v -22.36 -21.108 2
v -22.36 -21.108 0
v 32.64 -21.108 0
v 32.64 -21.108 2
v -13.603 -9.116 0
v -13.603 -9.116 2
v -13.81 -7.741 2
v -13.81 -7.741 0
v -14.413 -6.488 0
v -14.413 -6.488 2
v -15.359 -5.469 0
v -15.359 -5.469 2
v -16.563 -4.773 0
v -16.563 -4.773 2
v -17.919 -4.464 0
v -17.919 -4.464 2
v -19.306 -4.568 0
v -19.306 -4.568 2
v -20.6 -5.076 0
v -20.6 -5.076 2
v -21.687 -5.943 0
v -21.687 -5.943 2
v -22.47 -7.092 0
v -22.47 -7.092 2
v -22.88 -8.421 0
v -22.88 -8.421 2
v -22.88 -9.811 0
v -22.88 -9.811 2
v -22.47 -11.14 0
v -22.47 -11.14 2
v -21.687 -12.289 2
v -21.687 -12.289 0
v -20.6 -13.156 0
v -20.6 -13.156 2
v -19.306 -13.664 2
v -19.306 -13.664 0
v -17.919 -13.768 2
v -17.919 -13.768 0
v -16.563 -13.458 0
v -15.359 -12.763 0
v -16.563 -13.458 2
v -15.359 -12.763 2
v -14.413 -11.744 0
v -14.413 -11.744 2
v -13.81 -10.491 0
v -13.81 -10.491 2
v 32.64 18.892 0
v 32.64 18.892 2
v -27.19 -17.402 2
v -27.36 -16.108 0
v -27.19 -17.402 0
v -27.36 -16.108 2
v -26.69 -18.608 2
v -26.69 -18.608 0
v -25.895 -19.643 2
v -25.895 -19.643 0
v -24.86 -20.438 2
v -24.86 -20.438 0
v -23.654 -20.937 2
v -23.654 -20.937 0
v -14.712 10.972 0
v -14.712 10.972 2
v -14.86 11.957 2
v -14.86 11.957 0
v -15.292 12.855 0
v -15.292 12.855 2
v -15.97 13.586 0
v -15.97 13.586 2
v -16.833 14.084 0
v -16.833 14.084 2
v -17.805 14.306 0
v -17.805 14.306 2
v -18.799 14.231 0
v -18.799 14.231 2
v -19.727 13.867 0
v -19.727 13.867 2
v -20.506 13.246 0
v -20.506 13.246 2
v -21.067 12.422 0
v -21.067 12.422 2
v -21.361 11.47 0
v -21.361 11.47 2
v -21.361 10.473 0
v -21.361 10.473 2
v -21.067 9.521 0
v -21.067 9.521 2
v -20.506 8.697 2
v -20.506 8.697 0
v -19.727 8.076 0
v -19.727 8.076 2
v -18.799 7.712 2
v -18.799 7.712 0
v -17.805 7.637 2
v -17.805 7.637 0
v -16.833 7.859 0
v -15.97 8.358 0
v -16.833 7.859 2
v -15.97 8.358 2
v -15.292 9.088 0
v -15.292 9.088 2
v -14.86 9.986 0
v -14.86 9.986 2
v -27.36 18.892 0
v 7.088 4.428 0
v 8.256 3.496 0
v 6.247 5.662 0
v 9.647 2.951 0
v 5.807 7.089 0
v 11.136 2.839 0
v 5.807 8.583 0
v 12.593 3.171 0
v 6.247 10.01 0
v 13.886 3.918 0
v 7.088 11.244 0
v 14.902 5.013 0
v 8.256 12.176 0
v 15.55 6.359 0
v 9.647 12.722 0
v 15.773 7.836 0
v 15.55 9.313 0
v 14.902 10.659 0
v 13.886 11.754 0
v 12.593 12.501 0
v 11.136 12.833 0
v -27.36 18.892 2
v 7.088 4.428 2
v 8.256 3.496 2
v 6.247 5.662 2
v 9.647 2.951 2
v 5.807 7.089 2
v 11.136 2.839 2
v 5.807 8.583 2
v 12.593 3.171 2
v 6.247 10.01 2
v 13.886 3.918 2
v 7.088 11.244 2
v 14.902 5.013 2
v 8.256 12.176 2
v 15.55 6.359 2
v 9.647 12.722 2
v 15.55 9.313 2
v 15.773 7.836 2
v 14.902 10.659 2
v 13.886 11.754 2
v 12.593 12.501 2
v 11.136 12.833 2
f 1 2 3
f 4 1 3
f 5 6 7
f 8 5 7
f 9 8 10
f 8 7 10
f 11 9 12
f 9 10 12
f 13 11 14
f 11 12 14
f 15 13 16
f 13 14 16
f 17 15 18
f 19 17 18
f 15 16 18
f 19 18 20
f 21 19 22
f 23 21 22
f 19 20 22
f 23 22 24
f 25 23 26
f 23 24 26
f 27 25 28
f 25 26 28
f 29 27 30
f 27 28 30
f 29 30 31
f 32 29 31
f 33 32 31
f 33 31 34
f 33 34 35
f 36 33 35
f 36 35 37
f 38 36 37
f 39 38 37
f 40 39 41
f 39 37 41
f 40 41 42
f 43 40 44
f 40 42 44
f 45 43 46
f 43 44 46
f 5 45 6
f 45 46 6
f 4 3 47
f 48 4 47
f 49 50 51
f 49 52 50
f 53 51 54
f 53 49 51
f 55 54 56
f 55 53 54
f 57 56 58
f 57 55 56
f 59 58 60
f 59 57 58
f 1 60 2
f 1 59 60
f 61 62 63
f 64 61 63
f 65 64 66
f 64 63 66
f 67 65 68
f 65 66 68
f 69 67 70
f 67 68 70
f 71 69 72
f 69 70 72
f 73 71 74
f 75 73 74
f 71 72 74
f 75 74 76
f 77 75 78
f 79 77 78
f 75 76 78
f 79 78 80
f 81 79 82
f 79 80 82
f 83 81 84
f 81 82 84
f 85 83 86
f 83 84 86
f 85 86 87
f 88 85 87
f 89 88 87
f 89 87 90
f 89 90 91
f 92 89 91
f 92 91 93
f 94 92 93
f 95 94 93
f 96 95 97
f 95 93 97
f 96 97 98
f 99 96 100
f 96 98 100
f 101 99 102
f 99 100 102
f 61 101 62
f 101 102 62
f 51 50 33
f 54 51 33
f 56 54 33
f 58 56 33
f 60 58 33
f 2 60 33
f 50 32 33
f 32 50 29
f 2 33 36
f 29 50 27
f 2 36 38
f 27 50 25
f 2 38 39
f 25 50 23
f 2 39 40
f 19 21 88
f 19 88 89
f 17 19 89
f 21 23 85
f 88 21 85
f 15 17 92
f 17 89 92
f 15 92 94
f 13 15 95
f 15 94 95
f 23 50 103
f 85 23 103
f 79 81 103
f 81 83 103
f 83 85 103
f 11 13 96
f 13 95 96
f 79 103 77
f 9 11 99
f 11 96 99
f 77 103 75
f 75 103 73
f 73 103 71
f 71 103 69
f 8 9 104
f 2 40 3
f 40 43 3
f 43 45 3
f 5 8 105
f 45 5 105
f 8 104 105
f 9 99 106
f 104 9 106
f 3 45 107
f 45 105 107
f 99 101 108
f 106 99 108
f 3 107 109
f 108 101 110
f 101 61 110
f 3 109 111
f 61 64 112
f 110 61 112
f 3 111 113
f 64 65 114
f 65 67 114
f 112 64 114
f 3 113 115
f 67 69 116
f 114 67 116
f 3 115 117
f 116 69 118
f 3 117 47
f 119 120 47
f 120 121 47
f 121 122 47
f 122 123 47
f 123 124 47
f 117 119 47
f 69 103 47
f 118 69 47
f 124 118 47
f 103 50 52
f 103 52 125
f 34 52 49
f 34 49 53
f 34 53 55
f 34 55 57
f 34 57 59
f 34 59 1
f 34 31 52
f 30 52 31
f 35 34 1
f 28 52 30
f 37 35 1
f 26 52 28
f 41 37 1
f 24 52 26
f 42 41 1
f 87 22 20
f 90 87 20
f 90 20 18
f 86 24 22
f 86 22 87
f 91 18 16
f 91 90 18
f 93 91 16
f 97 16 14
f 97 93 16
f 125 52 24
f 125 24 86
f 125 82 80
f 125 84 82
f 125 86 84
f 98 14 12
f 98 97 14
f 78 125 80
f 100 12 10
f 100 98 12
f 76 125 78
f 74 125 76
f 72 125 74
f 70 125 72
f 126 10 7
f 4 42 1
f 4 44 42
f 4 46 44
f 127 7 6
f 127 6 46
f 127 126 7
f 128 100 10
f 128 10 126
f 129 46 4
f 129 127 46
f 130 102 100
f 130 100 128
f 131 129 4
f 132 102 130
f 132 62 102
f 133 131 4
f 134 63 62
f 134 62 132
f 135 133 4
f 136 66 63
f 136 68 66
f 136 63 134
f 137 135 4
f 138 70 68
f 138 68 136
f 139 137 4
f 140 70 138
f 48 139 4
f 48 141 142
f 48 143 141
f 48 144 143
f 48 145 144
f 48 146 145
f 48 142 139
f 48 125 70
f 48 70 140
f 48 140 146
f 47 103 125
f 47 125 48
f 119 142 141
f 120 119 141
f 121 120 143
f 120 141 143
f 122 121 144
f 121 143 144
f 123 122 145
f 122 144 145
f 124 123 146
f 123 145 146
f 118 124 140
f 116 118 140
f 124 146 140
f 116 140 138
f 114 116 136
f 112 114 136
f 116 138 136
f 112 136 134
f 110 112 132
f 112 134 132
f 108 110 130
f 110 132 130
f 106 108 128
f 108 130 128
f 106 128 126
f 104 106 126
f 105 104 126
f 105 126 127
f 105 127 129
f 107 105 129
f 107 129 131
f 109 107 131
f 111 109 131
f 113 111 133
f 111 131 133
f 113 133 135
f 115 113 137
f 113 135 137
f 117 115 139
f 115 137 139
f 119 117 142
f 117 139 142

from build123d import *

# Parameters (mm, degrees)
F0_W     = 60
F0_H     = 40
F1_DEPTH = 2
F2_R     = 3.343447
F2_R_2   = 4.664946
F2_R_3   = 5.011125
F3_DEPTH = 2
F4_R     = 5


with BuildPart() as f1:
    # F0 (on Top) → F1 (new body)
    with BuildSketch(Plane.XY):
        with Locations((2.640124, -1.107821)):
            Rectangle(F0_W, F0_H)
    extrude(amount=F1_DEPTH)

    # F2 (on face) → F3 (cut)
    with BuildSketch(Plane.XY.offset(2)):
        with Locations((-18.054973, 10.971558)):
            Circle(F2_R)
        with Locations((-18.267456, -9.115866)):
            Circle(F2_R_2)
        with Locations((10.761856, 7.836044)):
            Circle(F2_R_3)
    extrude(amount=-F3_DEPTH, mode=Mode.SUBTRACT)

    # F4
    f4_edges = [f1.edges().sort_by_distance(p)[0] for p in [
        (-27.359876, -21.107821, 1),
    ]]
    fillet(f4_edges, radius=F4_R)


solid = f1.part
